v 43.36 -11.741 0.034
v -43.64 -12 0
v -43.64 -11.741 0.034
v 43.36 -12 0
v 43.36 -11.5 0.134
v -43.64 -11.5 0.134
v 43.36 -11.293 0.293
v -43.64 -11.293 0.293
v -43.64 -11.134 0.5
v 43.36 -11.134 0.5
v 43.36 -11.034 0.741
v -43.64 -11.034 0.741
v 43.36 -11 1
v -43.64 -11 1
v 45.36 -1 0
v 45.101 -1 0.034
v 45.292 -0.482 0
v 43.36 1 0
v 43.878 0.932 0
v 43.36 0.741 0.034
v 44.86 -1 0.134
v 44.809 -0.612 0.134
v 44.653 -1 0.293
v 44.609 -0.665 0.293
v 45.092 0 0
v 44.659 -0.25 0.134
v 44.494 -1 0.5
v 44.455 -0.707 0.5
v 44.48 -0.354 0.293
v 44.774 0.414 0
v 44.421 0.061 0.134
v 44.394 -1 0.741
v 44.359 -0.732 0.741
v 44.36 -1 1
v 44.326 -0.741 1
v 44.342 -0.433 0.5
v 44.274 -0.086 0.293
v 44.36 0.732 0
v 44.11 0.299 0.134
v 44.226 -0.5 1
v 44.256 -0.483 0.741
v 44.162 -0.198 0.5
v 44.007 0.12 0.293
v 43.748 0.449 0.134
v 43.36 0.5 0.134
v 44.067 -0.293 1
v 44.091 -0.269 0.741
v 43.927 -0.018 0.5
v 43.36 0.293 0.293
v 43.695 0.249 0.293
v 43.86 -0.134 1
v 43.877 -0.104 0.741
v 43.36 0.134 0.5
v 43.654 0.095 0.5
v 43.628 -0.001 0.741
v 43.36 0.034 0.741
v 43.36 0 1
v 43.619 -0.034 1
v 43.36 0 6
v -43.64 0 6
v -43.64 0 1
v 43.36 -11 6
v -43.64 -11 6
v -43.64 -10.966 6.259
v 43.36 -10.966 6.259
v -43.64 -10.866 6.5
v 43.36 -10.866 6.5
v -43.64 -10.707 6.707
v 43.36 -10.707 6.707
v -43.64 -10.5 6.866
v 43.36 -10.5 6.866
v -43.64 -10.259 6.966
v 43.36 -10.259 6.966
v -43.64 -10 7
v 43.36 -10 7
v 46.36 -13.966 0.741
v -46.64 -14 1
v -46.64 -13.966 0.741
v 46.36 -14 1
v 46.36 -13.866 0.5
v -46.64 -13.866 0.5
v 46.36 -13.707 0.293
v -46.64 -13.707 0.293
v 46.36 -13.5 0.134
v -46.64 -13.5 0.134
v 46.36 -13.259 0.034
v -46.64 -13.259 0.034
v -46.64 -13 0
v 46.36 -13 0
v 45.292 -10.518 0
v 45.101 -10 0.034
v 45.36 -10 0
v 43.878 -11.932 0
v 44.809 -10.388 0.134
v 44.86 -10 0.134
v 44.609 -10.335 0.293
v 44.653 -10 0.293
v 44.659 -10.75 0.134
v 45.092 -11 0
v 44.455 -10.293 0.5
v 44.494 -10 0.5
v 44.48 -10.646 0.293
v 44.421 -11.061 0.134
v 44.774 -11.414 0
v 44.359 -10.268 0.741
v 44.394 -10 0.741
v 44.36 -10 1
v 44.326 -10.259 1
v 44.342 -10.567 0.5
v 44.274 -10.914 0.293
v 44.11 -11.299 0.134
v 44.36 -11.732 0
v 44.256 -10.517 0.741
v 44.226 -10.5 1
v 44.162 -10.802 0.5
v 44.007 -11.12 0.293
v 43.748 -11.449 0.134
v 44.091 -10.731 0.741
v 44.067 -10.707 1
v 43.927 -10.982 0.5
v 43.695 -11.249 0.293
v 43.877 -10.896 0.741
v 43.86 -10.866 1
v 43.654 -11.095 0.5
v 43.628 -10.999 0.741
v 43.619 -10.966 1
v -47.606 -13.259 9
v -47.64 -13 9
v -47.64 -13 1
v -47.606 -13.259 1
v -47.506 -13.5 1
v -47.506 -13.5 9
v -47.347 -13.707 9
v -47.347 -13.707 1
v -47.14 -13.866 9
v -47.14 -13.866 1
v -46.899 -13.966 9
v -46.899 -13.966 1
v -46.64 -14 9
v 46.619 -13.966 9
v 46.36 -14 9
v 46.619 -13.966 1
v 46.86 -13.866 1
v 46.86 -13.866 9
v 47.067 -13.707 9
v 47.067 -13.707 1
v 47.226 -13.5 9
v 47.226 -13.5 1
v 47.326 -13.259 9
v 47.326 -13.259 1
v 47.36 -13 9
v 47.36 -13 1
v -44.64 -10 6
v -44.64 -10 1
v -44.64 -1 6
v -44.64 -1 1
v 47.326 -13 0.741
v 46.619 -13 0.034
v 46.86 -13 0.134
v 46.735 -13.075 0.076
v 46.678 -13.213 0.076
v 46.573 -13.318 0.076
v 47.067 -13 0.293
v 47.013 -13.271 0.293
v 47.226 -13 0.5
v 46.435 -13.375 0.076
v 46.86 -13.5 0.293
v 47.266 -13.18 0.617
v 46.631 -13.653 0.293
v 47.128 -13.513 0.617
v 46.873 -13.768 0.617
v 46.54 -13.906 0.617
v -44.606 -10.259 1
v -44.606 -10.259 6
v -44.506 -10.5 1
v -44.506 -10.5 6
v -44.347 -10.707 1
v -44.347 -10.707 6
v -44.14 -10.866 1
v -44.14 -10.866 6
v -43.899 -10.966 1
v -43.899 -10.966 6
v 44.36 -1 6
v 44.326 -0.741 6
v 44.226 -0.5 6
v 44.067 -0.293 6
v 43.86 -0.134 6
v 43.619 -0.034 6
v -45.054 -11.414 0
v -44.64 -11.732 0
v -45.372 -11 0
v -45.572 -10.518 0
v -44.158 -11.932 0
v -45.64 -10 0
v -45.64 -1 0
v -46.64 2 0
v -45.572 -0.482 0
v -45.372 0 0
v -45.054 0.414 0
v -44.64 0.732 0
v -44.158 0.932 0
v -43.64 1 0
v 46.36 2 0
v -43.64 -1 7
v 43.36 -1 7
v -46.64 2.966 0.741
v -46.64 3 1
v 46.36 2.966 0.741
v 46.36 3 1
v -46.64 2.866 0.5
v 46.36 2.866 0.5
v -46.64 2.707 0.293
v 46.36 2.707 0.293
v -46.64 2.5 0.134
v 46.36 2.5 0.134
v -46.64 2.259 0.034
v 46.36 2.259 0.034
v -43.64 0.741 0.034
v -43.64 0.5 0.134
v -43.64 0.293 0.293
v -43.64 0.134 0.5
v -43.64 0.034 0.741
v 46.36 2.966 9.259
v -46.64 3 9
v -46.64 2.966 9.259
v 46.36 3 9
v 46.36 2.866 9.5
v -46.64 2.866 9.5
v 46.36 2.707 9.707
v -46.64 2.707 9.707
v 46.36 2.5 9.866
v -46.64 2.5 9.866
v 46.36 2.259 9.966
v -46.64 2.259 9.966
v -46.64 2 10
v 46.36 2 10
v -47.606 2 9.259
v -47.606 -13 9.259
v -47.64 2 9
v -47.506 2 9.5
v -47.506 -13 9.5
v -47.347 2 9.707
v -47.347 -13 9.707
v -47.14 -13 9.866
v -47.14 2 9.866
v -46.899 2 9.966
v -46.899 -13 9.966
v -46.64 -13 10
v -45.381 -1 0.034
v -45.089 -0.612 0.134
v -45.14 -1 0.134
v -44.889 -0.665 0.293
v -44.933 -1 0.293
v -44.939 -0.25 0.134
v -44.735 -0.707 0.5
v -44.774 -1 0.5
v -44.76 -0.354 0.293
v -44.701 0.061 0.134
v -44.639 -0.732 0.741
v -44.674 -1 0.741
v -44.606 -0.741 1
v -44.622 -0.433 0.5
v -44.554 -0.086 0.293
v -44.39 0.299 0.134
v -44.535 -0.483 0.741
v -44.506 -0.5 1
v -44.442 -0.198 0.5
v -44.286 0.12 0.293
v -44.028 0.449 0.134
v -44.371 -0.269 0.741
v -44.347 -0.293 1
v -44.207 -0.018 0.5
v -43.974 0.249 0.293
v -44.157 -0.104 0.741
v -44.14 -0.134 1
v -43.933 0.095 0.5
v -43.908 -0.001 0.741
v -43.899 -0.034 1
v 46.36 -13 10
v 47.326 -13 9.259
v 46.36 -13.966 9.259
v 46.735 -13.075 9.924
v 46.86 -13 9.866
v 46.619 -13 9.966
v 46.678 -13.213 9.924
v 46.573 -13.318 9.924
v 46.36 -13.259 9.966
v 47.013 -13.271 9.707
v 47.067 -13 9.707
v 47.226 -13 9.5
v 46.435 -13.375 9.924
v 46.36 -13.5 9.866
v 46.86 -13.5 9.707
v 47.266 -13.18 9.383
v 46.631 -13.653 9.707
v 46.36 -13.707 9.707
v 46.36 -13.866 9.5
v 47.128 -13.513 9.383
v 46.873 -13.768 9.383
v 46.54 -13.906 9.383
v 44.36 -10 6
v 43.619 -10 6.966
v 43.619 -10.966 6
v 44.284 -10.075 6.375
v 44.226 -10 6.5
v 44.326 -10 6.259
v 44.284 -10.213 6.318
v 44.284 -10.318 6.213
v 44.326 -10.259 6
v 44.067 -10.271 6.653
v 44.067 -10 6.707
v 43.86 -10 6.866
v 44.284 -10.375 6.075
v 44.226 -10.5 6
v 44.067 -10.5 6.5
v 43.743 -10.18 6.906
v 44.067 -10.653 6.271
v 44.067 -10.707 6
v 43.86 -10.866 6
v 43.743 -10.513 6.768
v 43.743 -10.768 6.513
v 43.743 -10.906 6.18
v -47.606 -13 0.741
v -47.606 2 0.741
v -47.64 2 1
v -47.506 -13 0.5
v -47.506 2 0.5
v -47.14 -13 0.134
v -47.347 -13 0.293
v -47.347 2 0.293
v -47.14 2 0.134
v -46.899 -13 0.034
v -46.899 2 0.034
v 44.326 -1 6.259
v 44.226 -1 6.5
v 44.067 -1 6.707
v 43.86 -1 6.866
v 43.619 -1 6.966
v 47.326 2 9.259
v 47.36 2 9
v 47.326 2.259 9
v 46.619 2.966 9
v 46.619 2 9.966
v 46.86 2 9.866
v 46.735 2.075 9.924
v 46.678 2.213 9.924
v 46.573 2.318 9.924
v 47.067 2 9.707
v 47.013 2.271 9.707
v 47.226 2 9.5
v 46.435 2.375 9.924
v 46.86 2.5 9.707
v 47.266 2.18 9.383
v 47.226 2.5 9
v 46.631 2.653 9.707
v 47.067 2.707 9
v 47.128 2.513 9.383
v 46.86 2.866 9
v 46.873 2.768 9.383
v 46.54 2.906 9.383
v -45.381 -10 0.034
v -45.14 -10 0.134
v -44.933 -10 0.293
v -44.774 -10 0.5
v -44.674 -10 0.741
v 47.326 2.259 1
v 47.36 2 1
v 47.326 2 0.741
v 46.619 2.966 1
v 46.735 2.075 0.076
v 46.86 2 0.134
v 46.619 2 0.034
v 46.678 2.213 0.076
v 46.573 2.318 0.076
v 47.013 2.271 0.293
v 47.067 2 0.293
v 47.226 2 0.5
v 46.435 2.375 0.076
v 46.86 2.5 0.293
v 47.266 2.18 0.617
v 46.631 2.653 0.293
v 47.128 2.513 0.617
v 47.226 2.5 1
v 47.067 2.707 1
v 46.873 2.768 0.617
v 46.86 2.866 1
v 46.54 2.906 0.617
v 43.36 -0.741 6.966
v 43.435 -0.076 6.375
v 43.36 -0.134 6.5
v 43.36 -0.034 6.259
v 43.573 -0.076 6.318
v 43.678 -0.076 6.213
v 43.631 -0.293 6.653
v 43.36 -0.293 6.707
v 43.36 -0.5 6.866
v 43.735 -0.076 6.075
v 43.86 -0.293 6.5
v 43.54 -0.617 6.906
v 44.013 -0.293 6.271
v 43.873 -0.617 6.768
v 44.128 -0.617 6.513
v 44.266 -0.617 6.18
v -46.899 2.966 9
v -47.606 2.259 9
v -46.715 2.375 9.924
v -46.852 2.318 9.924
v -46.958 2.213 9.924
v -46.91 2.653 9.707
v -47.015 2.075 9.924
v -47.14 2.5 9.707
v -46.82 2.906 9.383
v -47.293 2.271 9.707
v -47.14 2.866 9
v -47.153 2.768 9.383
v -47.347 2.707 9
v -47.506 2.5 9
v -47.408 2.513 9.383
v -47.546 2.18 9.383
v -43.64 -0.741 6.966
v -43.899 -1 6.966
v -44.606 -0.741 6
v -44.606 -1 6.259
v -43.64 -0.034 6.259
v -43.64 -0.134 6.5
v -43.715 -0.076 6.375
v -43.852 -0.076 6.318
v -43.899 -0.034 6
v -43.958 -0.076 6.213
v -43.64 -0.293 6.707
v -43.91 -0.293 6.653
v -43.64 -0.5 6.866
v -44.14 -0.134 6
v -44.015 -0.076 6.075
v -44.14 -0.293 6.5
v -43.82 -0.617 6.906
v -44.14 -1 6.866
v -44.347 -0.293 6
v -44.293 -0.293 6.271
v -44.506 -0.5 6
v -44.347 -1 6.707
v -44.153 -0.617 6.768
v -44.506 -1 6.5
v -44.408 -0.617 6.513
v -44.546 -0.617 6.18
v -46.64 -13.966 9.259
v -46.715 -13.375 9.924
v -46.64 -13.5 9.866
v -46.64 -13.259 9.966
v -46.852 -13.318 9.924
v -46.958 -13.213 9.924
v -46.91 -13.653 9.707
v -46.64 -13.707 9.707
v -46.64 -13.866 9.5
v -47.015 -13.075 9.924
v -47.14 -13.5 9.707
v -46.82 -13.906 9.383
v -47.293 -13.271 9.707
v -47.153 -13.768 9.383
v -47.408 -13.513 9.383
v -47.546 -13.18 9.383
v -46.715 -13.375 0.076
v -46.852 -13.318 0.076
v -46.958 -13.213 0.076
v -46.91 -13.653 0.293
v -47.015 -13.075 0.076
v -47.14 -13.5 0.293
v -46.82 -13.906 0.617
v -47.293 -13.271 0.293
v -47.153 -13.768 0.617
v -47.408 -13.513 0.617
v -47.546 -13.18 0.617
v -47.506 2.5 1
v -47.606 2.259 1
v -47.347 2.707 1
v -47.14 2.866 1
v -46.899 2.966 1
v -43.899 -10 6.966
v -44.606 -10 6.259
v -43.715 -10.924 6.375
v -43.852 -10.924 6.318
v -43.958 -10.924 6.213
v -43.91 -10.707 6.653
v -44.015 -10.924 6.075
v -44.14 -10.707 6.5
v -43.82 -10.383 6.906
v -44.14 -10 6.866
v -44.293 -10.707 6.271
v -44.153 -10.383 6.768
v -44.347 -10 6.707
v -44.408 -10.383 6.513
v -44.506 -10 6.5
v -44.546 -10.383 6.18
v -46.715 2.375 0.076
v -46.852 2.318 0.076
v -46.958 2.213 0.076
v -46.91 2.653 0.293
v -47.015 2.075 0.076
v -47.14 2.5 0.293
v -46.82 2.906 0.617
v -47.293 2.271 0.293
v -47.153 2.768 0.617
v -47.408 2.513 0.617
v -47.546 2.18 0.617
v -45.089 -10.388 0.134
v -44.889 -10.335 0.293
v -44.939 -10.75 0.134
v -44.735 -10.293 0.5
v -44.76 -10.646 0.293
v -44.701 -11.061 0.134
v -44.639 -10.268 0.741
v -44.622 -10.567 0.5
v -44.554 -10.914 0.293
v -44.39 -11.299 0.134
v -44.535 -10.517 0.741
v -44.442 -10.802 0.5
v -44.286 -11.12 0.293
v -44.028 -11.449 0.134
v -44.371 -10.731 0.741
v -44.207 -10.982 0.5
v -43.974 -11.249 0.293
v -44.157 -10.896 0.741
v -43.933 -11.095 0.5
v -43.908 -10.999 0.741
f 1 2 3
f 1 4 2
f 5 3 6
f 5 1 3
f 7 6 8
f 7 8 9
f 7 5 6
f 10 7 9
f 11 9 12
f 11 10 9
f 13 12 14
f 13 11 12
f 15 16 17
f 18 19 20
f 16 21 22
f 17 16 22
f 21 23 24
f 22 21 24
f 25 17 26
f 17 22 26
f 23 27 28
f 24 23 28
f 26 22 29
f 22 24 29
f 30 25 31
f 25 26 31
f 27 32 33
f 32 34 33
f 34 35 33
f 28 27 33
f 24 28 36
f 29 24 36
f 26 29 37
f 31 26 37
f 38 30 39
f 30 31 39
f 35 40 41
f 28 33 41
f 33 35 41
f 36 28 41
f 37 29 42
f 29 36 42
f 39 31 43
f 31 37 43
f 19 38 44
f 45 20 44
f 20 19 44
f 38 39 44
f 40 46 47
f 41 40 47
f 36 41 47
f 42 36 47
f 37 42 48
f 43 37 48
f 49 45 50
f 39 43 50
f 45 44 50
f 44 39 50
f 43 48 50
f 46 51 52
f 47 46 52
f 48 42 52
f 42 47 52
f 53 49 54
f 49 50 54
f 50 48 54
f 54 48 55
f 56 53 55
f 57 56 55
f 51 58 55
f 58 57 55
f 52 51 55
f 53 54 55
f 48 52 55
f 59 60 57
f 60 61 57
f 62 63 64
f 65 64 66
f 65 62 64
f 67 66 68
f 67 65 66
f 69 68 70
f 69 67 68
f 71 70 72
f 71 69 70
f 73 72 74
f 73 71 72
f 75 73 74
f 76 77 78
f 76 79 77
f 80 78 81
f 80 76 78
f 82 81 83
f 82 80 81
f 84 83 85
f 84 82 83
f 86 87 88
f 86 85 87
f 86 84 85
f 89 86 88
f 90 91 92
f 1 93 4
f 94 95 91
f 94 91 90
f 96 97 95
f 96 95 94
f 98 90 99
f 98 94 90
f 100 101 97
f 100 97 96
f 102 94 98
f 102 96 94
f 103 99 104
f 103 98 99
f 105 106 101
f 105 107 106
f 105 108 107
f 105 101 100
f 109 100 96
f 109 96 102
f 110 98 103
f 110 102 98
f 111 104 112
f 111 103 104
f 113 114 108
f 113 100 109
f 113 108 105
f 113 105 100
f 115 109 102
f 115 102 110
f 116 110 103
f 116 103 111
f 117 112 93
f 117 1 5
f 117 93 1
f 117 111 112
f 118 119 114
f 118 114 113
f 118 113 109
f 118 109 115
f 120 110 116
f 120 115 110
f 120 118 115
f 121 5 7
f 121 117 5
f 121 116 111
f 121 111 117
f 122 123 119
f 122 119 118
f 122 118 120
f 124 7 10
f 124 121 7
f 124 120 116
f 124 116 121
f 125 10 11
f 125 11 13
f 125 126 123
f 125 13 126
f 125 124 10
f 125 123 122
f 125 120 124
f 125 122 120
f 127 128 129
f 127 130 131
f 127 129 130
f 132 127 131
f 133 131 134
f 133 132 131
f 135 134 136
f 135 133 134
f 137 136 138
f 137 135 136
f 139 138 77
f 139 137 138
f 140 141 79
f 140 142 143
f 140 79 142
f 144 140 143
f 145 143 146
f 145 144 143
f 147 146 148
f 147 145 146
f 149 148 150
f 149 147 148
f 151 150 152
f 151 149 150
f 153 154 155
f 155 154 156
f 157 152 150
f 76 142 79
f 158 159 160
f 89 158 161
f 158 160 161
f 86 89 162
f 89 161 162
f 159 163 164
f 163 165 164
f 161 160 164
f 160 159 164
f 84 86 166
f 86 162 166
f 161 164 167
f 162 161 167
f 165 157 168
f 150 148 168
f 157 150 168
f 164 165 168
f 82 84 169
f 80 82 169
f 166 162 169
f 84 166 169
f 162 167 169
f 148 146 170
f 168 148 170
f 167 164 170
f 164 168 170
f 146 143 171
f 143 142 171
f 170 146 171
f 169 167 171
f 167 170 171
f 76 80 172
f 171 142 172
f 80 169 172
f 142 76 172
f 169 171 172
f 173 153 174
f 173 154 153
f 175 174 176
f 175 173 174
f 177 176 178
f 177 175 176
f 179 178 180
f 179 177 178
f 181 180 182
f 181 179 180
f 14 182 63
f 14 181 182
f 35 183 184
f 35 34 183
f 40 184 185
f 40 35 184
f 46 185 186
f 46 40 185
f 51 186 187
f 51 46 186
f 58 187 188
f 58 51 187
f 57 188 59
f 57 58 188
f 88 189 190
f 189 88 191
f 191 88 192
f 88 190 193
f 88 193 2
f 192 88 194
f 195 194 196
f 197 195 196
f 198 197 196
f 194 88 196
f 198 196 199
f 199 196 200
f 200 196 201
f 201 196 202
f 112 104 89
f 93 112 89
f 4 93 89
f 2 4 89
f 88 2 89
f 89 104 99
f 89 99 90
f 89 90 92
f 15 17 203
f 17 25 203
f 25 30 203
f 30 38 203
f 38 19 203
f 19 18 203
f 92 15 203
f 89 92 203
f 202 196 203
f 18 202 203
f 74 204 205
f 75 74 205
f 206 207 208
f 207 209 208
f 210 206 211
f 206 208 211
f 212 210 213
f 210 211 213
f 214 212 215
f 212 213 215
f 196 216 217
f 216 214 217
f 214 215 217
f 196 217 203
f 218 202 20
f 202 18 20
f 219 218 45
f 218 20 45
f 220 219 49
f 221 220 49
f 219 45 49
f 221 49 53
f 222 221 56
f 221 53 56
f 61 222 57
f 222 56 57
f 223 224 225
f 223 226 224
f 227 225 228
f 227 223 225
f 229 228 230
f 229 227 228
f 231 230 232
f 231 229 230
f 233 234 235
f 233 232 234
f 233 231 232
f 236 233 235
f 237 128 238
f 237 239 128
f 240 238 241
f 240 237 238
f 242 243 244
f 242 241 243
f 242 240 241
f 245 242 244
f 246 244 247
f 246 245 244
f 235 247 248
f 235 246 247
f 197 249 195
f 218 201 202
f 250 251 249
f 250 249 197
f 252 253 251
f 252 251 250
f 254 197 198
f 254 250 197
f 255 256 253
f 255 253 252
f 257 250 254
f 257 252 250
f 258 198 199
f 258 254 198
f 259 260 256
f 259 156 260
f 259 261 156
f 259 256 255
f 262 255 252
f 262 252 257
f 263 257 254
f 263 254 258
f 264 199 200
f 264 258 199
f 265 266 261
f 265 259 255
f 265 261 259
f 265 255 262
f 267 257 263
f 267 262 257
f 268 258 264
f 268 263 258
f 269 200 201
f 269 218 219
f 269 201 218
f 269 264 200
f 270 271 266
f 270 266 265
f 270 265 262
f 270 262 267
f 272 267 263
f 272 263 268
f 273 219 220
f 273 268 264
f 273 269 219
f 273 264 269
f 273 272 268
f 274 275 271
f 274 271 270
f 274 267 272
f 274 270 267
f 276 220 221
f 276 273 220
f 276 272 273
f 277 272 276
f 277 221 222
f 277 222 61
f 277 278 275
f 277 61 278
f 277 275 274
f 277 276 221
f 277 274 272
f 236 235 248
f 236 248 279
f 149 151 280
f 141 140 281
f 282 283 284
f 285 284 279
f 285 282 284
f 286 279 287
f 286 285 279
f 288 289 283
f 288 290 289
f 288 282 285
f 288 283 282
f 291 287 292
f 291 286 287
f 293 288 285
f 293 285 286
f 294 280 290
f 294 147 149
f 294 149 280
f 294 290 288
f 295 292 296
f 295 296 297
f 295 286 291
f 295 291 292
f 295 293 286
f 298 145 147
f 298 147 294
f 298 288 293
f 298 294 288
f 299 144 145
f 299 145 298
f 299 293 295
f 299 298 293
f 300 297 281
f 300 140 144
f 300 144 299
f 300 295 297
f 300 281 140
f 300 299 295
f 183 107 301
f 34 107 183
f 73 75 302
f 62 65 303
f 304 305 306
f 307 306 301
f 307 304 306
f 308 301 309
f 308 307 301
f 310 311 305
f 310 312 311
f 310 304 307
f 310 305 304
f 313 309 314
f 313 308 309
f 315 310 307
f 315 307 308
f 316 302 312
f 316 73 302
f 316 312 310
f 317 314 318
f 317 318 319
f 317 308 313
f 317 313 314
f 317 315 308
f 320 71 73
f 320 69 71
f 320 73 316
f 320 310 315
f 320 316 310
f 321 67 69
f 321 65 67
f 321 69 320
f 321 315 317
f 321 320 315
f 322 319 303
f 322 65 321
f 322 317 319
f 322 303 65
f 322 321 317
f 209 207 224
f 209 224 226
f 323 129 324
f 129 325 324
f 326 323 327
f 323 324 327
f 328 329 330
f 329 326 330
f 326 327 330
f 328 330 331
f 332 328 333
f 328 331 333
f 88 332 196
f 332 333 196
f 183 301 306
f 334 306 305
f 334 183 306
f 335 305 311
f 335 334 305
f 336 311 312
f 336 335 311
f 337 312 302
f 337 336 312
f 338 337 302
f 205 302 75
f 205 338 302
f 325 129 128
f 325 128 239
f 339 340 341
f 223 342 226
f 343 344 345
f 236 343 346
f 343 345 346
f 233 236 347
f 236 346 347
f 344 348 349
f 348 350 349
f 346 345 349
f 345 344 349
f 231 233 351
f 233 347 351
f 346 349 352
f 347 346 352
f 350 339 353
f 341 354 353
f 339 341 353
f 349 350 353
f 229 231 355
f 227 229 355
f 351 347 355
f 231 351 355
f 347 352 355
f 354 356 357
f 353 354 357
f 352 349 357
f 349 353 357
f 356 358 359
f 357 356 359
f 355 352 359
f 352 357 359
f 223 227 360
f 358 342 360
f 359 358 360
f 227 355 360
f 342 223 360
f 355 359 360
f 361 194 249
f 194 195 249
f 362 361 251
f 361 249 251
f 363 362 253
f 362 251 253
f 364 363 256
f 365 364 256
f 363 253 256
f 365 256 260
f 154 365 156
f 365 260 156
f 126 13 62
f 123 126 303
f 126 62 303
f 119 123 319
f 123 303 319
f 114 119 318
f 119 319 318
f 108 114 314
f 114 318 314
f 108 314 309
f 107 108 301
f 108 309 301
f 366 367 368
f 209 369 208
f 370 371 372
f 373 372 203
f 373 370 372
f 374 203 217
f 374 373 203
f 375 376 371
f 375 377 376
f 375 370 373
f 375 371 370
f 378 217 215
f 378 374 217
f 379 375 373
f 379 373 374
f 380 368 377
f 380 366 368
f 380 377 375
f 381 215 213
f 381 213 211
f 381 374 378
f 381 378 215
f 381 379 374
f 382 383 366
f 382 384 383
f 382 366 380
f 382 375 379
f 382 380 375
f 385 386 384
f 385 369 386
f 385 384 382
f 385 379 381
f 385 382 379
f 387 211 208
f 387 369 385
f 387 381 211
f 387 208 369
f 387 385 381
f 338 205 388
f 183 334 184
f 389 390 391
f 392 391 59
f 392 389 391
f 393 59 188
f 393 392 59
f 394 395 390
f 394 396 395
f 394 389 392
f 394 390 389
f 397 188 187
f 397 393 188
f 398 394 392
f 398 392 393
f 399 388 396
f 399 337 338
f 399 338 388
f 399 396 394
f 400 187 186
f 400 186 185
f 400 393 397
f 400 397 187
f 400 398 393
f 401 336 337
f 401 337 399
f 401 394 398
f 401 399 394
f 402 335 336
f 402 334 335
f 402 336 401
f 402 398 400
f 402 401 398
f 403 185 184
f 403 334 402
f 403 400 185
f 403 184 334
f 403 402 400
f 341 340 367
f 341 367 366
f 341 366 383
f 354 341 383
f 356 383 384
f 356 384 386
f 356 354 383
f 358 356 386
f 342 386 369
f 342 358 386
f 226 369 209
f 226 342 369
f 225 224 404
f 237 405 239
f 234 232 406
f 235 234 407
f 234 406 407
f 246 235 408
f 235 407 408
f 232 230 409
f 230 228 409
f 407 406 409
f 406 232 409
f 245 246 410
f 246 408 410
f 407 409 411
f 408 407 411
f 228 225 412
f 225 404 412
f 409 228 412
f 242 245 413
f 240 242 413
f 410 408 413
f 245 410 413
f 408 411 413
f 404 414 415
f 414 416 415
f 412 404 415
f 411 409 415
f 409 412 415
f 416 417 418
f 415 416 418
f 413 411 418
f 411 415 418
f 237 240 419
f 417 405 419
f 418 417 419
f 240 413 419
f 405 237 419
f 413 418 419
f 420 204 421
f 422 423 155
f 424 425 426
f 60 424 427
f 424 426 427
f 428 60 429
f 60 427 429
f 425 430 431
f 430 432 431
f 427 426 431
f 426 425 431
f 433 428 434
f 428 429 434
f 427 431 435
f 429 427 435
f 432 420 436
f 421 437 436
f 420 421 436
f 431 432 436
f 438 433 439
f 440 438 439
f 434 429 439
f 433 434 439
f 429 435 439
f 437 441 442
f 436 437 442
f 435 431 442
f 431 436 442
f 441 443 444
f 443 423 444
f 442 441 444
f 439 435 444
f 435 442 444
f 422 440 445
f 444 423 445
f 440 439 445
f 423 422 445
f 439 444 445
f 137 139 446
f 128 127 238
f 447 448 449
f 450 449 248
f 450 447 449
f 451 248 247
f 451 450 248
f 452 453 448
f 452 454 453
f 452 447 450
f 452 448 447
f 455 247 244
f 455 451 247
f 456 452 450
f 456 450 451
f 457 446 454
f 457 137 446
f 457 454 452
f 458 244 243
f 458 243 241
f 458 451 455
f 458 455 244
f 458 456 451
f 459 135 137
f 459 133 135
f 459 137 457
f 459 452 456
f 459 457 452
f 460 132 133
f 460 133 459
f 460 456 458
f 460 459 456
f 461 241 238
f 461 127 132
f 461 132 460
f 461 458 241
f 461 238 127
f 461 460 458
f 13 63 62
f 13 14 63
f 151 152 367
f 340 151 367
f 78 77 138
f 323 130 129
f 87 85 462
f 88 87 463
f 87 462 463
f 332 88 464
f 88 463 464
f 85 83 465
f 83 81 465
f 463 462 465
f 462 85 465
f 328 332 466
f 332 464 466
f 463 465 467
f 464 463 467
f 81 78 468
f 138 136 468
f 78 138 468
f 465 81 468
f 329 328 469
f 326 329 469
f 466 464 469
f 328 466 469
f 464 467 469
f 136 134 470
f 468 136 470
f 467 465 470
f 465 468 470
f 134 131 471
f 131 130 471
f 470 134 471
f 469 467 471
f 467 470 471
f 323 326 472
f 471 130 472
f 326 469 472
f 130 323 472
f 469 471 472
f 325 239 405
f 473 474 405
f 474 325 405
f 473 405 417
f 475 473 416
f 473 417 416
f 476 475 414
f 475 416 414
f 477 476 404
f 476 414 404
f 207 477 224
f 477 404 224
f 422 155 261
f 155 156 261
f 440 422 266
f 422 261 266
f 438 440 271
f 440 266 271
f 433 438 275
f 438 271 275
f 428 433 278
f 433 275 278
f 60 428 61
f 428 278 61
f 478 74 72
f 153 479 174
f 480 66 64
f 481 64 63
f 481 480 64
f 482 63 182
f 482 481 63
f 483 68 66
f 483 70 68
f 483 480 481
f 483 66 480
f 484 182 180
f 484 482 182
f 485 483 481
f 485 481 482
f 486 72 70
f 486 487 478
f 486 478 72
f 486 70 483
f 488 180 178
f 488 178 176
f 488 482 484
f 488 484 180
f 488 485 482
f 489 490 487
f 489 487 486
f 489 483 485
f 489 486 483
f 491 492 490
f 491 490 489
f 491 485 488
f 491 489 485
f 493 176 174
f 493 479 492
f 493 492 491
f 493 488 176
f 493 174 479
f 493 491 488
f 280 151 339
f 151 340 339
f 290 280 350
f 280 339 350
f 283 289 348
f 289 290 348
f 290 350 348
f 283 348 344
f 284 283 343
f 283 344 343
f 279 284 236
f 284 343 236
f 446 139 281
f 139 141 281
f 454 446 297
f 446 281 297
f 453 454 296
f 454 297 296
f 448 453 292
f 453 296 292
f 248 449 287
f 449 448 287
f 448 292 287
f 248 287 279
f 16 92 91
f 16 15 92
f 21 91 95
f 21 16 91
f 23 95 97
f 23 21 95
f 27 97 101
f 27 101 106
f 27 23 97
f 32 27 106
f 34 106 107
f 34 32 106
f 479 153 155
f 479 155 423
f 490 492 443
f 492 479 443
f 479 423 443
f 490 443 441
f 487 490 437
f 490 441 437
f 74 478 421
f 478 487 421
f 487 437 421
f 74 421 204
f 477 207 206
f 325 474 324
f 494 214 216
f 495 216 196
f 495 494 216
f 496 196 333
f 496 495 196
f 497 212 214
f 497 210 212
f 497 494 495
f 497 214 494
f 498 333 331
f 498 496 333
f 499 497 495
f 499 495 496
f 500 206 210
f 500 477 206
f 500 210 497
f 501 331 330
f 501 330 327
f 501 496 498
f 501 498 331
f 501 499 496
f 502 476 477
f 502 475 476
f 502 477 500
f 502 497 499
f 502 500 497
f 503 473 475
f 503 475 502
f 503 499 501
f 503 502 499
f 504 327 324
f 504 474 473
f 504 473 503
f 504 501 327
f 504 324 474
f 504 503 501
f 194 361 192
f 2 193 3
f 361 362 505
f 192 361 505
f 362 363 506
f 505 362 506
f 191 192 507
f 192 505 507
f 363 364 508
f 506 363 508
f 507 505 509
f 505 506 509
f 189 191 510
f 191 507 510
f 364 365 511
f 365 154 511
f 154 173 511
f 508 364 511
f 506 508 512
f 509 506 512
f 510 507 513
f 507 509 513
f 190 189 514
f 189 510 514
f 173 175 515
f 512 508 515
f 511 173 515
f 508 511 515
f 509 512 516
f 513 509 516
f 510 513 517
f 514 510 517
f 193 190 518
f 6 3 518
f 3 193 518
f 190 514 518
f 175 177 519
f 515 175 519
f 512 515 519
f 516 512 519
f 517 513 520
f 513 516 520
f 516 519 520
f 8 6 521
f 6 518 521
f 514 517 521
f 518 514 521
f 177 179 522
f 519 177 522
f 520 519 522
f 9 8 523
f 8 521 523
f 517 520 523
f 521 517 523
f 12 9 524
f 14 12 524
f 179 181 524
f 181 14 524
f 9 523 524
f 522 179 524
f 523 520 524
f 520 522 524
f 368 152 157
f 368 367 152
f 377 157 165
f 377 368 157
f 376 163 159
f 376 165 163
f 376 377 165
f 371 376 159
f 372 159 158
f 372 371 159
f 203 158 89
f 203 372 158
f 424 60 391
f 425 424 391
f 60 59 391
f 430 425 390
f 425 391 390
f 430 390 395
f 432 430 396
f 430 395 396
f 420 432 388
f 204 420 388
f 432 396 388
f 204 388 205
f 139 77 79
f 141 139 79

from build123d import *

# Parameters (mm, degrees)
F0_W     = 95
F0_H     = 17
F1_DEPTH = 10
F2_T     = -3
F3_R     = 1


with BuildPart() as f1:
    # F0 (on Top) → F1 (new body)
    with BuildSketch(Plane.XY):
        with Locations((-0.1398691535, -5.5)):
            Rectangle(F0_W, F0_H)
    extrude(amount=F1_DEPTH)

    # F2
    f2_openings = [f1.faces().sort_by_distance(p)[0] for p in [
        (-0.139869, -5.5, 0),
    ]]
    offset(amount=F2_T, openings=f2_openings)

    # F3
    f3_edges = [f1.edges().sort_by_distance(p)[0] for p in [
        (-44.639869, -5.5, 7),
        (-0.139869, -11, 7),
        (44.360131, -5.5, 7),
        (-0.139869, 0, 7),
        (-0.139869, 0, 0),
        (44.360131, 0, 3.5),
        (-44.639869, 0, 3.5),
        (-0.139869, -11, 0),
        (-44.639869, -11, 3.5),
        (44.360131, -11, 3.5),
        (47.360131, -14, 5),
        (47.360131, 3, 5),
        (47.360131, -5.5, 0),
        (47.360131, -5.5, 10),
        (-47.639869, -14, 5),
        (-0.139869, -14, 0),
        (-0.139869, -14, 10),
        (-47.639869, 3, 5),
        (-0.139869, 3, 0),
        (-0.139869, 3, 10),
        (-47.639869, -5.5, 0),
        (-47.639869, -5.5, 10),
        (44.360131, -5.5, 0),
        (-44.639869, -5.5, 0),
    ]]
    fillet(f3_edges, radius=F3_R)


solid = f1.part
